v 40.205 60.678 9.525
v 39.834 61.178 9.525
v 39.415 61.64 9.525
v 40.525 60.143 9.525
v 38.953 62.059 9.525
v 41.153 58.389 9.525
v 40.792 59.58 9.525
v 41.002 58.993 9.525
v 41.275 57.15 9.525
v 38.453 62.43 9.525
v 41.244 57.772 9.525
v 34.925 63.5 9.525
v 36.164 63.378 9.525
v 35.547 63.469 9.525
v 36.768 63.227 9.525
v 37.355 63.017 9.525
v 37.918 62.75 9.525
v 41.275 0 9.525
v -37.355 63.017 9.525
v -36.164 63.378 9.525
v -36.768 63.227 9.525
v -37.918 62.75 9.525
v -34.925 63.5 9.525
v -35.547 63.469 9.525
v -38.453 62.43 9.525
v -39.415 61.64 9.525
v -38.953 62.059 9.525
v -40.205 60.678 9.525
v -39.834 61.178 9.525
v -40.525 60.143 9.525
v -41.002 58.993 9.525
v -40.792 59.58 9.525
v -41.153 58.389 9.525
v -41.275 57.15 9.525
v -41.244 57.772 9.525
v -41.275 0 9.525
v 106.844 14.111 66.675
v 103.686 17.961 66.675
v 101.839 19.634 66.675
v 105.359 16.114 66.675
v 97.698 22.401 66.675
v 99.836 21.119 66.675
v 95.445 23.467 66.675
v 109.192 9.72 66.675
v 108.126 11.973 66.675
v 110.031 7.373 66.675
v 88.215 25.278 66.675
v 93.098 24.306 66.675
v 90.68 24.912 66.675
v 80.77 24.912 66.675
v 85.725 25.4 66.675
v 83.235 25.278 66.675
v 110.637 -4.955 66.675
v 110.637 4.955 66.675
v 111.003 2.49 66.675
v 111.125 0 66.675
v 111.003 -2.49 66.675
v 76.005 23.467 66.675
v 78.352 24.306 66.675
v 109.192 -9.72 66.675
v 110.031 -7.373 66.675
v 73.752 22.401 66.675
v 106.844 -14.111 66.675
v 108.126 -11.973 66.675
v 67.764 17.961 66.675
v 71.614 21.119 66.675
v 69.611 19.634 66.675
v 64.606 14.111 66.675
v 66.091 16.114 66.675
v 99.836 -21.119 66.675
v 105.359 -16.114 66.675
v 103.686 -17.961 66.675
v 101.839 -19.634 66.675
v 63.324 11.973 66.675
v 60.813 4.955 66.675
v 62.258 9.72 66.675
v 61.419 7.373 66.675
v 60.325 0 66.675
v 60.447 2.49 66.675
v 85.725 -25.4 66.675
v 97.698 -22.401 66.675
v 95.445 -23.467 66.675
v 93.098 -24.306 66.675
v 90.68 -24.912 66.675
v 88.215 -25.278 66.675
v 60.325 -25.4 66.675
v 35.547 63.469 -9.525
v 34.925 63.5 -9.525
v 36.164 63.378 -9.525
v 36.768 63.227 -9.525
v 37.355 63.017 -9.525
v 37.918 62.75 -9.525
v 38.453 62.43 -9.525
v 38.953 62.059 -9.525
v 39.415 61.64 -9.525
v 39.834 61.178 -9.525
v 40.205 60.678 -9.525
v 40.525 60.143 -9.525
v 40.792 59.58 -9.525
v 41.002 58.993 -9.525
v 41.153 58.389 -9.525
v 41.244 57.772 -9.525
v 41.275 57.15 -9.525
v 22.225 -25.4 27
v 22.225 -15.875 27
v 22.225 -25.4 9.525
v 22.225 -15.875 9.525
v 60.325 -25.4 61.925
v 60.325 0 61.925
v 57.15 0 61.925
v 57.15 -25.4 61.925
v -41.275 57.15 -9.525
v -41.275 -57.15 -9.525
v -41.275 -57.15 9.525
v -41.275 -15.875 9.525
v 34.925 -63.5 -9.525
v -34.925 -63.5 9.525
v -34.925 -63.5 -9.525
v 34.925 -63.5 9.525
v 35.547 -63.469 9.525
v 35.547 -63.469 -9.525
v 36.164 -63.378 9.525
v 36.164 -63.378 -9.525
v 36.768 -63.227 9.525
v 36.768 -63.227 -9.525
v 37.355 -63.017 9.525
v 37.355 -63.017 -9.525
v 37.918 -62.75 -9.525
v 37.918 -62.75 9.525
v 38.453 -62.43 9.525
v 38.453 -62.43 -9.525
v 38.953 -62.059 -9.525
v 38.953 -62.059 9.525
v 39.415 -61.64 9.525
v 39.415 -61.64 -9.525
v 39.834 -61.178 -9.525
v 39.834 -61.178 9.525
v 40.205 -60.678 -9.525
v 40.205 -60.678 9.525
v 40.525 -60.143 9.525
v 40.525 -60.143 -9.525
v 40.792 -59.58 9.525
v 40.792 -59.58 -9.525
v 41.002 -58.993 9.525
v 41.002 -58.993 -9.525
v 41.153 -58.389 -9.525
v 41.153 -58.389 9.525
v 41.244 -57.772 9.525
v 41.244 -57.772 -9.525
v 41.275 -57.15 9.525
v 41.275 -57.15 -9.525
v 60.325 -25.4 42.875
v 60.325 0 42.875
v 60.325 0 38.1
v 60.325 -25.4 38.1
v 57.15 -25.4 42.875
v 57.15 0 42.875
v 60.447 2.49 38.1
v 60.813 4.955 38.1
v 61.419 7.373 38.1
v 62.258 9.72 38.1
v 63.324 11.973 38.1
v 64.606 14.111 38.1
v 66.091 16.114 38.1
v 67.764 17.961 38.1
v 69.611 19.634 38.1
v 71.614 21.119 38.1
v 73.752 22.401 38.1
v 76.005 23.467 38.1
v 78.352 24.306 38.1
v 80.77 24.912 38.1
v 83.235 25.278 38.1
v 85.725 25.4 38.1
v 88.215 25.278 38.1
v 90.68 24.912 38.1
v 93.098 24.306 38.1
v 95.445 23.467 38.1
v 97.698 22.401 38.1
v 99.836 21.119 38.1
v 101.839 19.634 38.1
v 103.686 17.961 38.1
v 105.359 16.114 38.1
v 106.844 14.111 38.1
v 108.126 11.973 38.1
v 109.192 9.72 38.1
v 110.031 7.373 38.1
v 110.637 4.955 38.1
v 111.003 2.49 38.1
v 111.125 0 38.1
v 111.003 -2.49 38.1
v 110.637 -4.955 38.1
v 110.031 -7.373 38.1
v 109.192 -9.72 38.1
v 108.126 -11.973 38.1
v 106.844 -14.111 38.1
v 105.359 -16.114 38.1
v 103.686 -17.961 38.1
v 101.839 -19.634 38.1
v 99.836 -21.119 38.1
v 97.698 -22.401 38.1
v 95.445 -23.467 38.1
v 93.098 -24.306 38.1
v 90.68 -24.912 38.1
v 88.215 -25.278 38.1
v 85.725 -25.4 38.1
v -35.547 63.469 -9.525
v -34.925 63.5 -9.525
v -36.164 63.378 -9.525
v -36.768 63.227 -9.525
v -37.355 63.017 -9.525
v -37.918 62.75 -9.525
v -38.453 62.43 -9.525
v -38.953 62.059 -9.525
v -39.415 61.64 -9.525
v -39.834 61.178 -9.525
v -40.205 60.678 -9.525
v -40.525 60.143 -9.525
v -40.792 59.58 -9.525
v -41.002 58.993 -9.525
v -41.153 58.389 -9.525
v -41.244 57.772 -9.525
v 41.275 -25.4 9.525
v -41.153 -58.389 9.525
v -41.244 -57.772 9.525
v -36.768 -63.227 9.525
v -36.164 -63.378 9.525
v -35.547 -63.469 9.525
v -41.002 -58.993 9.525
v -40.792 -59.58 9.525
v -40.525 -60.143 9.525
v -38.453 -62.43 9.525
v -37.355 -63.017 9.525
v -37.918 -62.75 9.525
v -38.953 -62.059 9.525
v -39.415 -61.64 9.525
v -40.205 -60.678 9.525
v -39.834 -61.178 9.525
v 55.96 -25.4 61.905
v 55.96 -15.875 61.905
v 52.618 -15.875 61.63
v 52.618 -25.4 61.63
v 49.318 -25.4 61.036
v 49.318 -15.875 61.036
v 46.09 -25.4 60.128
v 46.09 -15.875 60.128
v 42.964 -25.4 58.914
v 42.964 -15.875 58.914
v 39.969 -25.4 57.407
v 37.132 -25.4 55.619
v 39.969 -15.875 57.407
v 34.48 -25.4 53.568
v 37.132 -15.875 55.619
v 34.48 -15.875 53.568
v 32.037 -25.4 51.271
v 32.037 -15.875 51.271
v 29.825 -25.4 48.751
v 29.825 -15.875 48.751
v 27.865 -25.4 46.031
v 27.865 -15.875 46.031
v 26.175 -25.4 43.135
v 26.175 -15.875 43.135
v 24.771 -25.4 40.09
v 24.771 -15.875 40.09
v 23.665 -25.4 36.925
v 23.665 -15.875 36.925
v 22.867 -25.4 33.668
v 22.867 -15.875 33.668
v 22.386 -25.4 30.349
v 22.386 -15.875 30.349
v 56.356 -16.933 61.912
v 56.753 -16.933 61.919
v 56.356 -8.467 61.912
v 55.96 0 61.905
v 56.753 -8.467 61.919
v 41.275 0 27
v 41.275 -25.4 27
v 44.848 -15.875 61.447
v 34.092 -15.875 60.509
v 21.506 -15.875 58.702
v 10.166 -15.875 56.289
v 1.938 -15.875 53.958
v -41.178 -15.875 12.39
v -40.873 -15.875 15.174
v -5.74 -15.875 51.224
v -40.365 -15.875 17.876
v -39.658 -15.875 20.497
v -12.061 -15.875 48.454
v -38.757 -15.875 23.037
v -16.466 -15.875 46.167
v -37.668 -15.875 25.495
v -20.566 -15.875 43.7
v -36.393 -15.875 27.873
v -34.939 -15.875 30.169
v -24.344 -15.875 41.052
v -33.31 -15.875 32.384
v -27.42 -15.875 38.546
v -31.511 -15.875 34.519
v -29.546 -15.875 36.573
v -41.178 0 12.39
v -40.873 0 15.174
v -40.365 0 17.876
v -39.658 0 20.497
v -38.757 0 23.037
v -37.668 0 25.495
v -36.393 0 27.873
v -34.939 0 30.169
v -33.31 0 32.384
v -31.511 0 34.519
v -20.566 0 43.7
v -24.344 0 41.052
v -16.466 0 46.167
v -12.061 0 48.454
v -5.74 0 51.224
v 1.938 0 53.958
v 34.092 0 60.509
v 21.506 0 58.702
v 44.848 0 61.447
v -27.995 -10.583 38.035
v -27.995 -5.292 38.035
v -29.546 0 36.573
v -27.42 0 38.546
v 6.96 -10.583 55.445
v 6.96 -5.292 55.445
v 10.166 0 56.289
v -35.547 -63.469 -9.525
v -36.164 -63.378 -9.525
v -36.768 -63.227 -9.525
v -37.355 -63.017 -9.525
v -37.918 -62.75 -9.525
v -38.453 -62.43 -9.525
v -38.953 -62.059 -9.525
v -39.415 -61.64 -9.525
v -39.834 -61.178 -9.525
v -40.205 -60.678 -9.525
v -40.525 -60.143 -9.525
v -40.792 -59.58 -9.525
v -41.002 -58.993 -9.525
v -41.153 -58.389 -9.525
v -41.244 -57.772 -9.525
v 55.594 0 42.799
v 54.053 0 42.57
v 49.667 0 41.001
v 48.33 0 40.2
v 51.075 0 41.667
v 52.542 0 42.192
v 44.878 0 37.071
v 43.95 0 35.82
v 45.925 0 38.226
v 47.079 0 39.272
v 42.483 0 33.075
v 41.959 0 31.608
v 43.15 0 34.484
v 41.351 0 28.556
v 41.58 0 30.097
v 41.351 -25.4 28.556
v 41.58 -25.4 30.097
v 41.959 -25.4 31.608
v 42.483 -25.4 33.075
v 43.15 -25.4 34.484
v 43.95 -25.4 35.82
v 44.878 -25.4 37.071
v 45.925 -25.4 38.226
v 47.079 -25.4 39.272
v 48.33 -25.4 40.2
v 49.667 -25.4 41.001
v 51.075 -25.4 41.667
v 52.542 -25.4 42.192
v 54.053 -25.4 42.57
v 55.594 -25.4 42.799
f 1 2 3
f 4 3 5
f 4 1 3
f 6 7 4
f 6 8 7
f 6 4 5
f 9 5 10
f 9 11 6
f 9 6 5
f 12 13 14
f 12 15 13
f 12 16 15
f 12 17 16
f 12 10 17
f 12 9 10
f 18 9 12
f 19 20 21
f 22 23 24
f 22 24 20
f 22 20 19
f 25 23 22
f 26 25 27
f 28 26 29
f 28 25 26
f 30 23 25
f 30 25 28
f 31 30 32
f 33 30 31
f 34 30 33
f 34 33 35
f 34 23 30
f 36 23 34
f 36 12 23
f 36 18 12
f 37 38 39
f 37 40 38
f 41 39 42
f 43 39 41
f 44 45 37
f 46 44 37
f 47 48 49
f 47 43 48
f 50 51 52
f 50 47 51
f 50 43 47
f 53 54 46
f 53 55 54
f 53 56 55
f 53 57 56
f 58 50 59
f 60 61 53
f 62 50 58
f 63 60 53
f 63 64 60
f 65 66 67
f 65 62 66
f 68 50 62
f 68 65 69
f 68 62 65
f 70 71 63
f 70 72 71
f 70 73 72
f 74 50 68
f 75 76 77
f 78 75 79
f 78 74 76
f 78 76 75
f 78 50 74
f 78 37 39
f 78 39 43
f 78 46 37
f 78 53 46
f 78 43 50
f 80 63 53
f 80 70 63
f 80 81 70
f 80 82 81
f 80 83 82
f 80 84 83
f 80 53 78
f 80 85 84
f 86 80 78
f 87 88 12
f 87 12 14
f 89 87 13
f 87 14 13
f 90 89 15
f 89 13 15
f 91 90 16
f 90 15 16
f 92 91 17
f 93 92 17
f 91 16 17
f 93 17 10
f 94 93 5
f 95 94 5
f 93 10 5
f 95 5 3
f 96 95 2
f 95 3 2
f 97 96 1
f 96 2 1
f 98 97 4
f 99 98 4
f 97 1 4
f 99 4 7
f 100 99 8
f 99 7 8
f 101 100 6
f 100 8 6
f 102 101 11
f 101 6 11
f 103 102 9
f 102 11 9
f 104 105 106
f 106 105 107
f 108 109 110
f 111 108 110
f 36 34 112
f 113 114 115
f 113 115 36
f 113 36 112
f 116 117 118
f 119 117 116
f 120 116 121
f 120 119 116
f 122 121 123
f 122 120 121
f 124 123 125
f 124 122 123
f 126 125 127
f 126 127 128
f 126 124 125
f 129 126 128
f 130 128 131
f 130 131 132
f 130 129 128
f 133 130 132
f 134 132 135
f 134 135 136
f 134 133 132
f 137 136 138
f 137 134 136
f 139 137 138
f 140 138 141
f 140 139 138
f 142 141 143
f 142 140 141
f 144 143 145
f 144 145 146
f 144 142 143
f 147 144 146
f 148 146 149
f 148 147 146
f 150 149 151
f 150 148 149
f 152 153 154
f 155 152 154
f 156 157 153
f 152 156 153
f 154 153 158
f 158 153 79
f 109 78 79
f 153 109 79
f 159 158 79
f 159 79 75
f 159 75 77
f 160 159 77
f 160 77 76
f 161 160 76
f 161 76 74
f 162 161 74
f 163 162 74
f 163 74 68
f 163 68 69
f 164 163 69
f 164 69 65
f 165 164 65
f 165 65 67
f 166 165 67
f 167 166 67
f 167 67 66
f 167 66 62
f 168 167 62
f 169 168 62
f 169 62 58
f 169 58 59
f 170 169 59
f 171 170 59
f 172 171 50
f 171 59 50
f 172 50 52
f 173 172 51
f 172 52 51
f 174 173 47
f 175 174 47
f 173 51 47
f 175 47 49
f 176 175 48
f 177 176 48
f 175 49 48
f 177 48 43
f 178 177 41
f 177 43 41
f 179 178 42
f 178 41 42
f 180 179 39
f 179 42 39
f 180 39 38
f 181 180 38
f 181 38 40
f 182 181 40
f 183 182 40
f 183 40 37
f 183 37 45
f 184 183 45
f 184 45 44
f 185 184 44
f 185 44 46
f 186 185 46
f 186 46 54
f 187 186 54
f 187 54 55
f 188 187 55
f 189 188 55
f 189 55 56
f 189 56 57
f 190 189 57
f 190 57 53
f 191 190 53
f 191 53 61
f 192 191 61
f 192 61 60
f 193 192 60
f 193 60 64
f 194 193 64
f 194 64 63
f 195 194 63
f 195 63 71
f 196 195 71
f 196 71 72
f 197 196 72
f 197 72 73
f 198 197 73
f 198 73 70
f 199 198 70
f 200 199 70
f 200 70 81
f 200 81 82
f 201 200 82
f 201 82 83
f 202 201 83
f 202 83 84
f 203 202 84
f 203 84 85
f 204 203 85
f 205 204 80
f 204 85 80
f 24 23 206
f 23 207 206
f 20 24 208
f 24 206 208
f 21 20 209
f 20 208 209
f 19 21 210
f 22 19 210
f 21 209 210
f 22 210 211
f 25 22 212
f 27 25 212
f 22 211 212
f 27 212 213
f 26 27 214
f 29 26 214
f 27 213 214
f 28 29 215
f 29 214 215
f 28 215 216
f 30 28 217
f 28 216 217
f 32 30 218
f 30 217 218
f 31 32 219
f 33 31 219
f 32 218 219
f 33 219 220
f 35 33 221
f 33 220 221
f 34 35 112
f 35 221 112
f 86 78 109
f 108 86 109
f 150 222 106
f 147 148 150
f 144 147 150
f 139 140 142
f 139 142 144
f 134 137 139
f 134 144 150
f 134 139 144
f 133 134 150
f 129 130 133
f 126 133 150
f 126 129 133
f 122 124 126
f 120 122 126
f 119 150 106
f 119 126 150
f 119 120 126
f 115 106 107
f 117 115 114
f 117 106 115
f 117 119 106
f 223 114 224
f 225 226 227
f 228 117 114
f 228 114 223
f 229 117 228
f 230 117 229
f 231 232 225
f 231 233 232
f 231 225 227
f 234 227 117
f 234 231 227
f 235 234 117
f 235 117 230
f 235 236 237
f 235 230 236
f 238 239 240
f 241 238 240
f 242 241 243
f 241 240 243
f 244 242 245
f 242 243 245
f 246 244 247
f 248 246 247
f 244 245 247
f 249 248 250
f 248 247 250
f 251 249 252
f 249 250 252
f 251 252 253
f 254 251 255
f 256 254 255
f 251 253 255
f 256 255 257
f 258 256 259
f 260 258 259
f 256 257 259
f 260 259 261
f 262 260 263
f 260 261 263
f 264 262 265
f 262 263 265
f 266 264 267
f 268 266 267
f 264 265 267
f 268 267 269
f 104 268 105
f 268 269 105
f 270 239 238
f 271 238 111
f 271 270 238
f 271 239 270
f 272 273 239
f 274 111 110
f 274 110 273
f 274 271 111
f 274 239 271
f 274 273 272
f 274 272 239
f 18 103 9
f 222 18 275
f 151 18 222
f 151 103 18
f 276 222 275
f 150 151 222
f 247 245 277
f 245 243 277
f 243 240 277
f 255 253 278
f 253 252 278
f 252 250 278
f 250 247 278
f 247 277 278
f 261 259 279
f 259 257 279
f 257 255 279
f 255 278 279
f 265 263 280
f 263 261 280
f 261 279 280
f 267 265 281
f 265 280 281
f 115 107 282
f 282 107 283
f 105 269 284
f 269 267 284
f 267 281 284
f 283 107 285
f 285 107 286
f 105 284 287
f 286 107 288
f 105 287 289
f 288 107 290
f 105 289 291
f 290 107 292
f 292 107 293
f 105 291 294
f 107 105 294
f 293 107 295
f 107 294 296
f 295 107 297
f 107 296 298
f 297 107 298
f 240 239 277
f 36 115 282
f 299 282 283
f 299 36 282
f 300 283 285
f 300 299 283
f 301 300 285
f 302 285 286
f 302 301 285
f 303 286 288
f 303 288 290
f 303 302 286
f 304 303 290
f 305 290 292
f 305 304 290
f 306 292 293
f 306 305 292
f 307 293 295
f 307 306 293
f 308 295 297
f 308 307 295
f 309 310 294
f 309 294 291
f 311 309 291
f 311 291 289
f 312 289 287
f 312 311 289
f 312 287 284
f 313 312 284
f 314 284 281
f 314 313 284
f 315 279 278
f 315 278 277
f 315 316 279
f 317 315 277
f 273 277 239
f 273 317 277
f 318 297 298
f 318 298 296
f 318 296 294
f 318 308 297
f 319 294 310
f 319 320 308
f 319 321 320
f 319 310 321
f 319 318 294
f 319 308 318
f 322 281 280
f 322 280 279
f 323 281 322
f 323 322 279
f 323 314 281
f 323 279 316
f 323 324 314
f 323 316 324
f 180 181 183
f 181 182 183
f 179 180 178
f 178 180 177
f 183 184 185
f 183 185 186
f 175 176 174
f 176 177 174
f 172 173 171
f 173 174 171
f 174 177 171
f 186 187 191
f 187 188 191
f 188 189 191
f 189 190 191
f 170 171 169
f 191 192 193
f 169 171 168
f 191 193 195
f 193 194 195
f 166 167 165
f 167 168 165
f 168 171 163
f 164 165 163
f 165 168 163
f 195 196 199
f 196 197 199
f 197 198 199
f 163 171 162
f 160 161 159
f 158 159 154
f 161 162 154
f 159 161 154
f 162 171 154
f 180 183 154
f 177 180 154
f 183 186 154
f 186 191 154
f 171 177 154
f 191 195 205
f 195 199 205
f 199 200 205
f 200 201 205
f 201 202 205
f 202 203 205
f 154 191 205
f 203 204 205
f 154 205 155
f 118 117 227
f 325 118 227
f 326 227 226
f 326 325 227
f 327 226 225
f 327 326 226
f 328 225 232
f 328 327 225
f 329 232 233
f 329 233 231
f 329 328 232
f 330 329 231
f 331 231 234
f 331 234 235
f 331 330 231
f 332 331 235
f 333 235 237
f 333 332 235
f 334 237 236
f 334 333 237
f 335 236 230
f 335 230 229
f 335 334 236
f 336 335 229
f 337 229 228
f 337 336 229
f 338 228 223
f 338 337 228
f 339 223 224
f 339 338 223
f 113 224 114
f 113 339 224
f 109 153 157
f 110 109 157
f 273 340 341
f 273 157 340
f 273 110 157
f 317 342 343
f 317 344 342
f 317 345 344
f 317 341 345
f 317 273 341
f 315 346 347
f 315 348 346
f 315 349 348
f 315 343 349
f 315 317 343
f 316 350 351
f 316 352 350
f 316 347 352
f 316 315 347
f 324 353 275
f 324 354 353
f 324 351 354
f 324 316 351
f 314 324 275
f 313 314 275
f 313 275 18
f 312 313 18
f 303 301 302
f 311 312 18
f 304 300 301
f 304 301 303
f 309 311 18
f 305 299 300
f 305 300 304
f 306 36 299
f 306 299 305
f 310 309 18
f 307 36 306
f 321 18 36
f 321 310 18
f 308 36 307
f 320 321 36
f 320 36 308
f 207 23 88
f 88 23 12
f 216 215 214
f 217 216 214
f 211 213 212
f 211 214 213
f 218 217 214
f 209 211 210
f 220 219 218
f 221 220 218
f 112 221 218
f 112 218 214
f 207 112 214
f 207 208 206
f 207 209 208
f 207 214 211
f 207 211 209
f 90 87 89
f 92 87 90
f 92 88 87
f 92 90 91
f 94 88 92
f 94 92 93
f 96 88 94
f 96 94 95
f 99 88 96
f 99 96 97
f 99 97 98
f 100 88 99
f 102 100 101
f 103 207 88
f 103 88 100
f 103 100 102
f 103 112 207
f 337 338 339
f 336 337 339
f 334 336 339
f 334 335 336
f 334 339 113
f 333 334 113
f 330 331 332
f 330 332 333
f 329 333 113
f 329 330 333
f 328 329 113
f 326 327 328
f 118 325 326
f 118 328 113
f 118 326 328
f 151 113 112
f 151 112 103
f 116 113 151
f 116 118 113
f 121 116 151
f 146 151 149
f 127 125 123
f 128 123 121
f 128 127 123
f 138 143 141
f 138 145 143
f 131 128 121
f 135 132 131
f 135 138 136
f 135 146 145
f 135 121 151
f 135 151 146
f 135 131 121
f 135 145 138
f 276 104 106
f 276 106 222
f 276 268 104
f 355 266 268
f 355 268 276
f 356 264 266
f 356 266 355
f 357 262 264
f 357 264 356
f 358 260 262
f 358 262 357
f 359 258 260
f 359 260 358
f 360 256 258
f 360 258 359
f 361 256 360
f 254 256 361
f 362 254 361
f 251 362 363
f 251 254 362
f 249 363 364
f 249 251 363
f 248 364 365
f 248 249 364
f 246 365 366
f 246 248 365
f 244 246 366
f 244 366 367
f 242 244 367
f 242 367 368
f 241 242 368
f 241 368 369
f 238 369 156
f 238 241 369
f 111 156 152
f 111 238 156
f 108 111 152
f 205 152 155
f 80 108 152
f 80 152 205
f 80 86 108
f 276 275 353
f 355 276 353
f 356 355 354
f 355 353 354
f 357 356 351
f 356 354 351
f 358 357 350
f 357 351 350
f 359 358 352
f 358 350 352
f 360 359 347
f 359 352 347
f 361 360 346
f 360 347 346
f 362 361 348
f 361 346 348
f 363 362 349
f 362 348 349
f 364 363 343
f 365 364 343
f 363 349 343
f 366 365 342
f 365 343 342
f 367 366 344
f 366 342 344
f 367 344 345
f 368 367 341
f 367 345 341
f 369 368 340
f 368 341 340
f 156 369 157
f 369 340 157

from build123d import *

# Parameters (mm, degrees)
F1_DEPTH = 63.5
F2_DEPTH = 25.4
F3_DEPTH = 15.875
F4_R     = 6.35
F0_W     = 25.4
F0_H     = 28.575


with BuildPart() as f1:
    # F0 (on Front) → F1 (new body, symmetric)
    with BuildSketch(Plane.XZ):
        Polygon((22.225, 9.525), (-41.275, 9.525), (-41.275, -9.525), (41.275, -9.525), (41.275, 9.525), align=None)
    extrude(amount=F1_DEPTH, both=True)

    # F0 (on Front) → F2 (join)
    with BuildSketch(Plane.XZ):
        with BuildLine():
            Line((22.225, 27.0002), (22.225, 9.525))
            Line((22.225, 9.525), (41.275, 9.525))
            Line((41.275, 9.525), (41.275, 27.0002))
            ThreePointArc((41.275, 27.0002), (45.92468, 38.22552), (57.15, 42.8752))
            Line((57.15, 42.8752), (60.325, 42.8752))
            Line((60.325, 42.8752), (60.325, 61.9252))
            Line((60.325, 61.9252), (57.15, 61.9252))
            add(Edge.make_bspline(
                [(55.959567, 61.904906), (56.355854, 61.91256), (56.75267, 61.919325), (57.15, 61.9252)],
                knots=[110.684323, 110.684323, 110.684323, 110.684323, 111.504536, 111.504536, 111.504536, 111.504536], degree=3))
            ThreePointArc((55.959567, 61.904906), (32.036941, 51.271374), (22.225, 27.0002))
        make_face()
        Polygon((60.325, 66.675), (60.325, 61.9252), (60.325, 42.8752), (60.325, 38.1), (85.725, 38.1), (85.725, 66.675), align=None)
    extrude(amount=F2_DEPTH)

    # F0 (on Front) → F3 (join)
    with BuildSketch(Plane.XZ):
        with BuildLine():
            add(Edge.make_bspline(
                [(-41.275, 9.525), (-41.377201, 43.632958), (2.482248, 60.871958), (55.959567, 61.904906)],
                knots=[0, 0, 0, 0, 110.684323, 110.684323, 110.684323, 110.684323], degree=3))
            Line((-41.275, 9.525), (22.225, 9.525))
            Line((22.225, 9.525), (22.225, 27.0002))
            ThreePointArc((22.225, 27.0002), (32.036941, 51.271374), (55.959567, 61.904906))
        make_face()
    extrude(amount=F3_DEPTH)

    # F4
    f4_edges = [f1.edges().sort_by_distance(p)[0] for p in [
        (-41.275, -63.5, 0),
        (41.275, -63.5, 0),
        (41.275, 63.5, 0),
        (-41.275, 63.5, 0),
    ]]
    fillet(f4_edges, radius=F4_R)

    # F0 (on Front) → F5 (revolve)
    with BuildSketch(Plane.XZ):
        with Locations((98.425, 52.3875)):
            Rectangle(F0_W, F0_H)
    revolve(axis=Axis((85.725, 0, 52.3875), (0, 0, -1)))


solid = f1.part
